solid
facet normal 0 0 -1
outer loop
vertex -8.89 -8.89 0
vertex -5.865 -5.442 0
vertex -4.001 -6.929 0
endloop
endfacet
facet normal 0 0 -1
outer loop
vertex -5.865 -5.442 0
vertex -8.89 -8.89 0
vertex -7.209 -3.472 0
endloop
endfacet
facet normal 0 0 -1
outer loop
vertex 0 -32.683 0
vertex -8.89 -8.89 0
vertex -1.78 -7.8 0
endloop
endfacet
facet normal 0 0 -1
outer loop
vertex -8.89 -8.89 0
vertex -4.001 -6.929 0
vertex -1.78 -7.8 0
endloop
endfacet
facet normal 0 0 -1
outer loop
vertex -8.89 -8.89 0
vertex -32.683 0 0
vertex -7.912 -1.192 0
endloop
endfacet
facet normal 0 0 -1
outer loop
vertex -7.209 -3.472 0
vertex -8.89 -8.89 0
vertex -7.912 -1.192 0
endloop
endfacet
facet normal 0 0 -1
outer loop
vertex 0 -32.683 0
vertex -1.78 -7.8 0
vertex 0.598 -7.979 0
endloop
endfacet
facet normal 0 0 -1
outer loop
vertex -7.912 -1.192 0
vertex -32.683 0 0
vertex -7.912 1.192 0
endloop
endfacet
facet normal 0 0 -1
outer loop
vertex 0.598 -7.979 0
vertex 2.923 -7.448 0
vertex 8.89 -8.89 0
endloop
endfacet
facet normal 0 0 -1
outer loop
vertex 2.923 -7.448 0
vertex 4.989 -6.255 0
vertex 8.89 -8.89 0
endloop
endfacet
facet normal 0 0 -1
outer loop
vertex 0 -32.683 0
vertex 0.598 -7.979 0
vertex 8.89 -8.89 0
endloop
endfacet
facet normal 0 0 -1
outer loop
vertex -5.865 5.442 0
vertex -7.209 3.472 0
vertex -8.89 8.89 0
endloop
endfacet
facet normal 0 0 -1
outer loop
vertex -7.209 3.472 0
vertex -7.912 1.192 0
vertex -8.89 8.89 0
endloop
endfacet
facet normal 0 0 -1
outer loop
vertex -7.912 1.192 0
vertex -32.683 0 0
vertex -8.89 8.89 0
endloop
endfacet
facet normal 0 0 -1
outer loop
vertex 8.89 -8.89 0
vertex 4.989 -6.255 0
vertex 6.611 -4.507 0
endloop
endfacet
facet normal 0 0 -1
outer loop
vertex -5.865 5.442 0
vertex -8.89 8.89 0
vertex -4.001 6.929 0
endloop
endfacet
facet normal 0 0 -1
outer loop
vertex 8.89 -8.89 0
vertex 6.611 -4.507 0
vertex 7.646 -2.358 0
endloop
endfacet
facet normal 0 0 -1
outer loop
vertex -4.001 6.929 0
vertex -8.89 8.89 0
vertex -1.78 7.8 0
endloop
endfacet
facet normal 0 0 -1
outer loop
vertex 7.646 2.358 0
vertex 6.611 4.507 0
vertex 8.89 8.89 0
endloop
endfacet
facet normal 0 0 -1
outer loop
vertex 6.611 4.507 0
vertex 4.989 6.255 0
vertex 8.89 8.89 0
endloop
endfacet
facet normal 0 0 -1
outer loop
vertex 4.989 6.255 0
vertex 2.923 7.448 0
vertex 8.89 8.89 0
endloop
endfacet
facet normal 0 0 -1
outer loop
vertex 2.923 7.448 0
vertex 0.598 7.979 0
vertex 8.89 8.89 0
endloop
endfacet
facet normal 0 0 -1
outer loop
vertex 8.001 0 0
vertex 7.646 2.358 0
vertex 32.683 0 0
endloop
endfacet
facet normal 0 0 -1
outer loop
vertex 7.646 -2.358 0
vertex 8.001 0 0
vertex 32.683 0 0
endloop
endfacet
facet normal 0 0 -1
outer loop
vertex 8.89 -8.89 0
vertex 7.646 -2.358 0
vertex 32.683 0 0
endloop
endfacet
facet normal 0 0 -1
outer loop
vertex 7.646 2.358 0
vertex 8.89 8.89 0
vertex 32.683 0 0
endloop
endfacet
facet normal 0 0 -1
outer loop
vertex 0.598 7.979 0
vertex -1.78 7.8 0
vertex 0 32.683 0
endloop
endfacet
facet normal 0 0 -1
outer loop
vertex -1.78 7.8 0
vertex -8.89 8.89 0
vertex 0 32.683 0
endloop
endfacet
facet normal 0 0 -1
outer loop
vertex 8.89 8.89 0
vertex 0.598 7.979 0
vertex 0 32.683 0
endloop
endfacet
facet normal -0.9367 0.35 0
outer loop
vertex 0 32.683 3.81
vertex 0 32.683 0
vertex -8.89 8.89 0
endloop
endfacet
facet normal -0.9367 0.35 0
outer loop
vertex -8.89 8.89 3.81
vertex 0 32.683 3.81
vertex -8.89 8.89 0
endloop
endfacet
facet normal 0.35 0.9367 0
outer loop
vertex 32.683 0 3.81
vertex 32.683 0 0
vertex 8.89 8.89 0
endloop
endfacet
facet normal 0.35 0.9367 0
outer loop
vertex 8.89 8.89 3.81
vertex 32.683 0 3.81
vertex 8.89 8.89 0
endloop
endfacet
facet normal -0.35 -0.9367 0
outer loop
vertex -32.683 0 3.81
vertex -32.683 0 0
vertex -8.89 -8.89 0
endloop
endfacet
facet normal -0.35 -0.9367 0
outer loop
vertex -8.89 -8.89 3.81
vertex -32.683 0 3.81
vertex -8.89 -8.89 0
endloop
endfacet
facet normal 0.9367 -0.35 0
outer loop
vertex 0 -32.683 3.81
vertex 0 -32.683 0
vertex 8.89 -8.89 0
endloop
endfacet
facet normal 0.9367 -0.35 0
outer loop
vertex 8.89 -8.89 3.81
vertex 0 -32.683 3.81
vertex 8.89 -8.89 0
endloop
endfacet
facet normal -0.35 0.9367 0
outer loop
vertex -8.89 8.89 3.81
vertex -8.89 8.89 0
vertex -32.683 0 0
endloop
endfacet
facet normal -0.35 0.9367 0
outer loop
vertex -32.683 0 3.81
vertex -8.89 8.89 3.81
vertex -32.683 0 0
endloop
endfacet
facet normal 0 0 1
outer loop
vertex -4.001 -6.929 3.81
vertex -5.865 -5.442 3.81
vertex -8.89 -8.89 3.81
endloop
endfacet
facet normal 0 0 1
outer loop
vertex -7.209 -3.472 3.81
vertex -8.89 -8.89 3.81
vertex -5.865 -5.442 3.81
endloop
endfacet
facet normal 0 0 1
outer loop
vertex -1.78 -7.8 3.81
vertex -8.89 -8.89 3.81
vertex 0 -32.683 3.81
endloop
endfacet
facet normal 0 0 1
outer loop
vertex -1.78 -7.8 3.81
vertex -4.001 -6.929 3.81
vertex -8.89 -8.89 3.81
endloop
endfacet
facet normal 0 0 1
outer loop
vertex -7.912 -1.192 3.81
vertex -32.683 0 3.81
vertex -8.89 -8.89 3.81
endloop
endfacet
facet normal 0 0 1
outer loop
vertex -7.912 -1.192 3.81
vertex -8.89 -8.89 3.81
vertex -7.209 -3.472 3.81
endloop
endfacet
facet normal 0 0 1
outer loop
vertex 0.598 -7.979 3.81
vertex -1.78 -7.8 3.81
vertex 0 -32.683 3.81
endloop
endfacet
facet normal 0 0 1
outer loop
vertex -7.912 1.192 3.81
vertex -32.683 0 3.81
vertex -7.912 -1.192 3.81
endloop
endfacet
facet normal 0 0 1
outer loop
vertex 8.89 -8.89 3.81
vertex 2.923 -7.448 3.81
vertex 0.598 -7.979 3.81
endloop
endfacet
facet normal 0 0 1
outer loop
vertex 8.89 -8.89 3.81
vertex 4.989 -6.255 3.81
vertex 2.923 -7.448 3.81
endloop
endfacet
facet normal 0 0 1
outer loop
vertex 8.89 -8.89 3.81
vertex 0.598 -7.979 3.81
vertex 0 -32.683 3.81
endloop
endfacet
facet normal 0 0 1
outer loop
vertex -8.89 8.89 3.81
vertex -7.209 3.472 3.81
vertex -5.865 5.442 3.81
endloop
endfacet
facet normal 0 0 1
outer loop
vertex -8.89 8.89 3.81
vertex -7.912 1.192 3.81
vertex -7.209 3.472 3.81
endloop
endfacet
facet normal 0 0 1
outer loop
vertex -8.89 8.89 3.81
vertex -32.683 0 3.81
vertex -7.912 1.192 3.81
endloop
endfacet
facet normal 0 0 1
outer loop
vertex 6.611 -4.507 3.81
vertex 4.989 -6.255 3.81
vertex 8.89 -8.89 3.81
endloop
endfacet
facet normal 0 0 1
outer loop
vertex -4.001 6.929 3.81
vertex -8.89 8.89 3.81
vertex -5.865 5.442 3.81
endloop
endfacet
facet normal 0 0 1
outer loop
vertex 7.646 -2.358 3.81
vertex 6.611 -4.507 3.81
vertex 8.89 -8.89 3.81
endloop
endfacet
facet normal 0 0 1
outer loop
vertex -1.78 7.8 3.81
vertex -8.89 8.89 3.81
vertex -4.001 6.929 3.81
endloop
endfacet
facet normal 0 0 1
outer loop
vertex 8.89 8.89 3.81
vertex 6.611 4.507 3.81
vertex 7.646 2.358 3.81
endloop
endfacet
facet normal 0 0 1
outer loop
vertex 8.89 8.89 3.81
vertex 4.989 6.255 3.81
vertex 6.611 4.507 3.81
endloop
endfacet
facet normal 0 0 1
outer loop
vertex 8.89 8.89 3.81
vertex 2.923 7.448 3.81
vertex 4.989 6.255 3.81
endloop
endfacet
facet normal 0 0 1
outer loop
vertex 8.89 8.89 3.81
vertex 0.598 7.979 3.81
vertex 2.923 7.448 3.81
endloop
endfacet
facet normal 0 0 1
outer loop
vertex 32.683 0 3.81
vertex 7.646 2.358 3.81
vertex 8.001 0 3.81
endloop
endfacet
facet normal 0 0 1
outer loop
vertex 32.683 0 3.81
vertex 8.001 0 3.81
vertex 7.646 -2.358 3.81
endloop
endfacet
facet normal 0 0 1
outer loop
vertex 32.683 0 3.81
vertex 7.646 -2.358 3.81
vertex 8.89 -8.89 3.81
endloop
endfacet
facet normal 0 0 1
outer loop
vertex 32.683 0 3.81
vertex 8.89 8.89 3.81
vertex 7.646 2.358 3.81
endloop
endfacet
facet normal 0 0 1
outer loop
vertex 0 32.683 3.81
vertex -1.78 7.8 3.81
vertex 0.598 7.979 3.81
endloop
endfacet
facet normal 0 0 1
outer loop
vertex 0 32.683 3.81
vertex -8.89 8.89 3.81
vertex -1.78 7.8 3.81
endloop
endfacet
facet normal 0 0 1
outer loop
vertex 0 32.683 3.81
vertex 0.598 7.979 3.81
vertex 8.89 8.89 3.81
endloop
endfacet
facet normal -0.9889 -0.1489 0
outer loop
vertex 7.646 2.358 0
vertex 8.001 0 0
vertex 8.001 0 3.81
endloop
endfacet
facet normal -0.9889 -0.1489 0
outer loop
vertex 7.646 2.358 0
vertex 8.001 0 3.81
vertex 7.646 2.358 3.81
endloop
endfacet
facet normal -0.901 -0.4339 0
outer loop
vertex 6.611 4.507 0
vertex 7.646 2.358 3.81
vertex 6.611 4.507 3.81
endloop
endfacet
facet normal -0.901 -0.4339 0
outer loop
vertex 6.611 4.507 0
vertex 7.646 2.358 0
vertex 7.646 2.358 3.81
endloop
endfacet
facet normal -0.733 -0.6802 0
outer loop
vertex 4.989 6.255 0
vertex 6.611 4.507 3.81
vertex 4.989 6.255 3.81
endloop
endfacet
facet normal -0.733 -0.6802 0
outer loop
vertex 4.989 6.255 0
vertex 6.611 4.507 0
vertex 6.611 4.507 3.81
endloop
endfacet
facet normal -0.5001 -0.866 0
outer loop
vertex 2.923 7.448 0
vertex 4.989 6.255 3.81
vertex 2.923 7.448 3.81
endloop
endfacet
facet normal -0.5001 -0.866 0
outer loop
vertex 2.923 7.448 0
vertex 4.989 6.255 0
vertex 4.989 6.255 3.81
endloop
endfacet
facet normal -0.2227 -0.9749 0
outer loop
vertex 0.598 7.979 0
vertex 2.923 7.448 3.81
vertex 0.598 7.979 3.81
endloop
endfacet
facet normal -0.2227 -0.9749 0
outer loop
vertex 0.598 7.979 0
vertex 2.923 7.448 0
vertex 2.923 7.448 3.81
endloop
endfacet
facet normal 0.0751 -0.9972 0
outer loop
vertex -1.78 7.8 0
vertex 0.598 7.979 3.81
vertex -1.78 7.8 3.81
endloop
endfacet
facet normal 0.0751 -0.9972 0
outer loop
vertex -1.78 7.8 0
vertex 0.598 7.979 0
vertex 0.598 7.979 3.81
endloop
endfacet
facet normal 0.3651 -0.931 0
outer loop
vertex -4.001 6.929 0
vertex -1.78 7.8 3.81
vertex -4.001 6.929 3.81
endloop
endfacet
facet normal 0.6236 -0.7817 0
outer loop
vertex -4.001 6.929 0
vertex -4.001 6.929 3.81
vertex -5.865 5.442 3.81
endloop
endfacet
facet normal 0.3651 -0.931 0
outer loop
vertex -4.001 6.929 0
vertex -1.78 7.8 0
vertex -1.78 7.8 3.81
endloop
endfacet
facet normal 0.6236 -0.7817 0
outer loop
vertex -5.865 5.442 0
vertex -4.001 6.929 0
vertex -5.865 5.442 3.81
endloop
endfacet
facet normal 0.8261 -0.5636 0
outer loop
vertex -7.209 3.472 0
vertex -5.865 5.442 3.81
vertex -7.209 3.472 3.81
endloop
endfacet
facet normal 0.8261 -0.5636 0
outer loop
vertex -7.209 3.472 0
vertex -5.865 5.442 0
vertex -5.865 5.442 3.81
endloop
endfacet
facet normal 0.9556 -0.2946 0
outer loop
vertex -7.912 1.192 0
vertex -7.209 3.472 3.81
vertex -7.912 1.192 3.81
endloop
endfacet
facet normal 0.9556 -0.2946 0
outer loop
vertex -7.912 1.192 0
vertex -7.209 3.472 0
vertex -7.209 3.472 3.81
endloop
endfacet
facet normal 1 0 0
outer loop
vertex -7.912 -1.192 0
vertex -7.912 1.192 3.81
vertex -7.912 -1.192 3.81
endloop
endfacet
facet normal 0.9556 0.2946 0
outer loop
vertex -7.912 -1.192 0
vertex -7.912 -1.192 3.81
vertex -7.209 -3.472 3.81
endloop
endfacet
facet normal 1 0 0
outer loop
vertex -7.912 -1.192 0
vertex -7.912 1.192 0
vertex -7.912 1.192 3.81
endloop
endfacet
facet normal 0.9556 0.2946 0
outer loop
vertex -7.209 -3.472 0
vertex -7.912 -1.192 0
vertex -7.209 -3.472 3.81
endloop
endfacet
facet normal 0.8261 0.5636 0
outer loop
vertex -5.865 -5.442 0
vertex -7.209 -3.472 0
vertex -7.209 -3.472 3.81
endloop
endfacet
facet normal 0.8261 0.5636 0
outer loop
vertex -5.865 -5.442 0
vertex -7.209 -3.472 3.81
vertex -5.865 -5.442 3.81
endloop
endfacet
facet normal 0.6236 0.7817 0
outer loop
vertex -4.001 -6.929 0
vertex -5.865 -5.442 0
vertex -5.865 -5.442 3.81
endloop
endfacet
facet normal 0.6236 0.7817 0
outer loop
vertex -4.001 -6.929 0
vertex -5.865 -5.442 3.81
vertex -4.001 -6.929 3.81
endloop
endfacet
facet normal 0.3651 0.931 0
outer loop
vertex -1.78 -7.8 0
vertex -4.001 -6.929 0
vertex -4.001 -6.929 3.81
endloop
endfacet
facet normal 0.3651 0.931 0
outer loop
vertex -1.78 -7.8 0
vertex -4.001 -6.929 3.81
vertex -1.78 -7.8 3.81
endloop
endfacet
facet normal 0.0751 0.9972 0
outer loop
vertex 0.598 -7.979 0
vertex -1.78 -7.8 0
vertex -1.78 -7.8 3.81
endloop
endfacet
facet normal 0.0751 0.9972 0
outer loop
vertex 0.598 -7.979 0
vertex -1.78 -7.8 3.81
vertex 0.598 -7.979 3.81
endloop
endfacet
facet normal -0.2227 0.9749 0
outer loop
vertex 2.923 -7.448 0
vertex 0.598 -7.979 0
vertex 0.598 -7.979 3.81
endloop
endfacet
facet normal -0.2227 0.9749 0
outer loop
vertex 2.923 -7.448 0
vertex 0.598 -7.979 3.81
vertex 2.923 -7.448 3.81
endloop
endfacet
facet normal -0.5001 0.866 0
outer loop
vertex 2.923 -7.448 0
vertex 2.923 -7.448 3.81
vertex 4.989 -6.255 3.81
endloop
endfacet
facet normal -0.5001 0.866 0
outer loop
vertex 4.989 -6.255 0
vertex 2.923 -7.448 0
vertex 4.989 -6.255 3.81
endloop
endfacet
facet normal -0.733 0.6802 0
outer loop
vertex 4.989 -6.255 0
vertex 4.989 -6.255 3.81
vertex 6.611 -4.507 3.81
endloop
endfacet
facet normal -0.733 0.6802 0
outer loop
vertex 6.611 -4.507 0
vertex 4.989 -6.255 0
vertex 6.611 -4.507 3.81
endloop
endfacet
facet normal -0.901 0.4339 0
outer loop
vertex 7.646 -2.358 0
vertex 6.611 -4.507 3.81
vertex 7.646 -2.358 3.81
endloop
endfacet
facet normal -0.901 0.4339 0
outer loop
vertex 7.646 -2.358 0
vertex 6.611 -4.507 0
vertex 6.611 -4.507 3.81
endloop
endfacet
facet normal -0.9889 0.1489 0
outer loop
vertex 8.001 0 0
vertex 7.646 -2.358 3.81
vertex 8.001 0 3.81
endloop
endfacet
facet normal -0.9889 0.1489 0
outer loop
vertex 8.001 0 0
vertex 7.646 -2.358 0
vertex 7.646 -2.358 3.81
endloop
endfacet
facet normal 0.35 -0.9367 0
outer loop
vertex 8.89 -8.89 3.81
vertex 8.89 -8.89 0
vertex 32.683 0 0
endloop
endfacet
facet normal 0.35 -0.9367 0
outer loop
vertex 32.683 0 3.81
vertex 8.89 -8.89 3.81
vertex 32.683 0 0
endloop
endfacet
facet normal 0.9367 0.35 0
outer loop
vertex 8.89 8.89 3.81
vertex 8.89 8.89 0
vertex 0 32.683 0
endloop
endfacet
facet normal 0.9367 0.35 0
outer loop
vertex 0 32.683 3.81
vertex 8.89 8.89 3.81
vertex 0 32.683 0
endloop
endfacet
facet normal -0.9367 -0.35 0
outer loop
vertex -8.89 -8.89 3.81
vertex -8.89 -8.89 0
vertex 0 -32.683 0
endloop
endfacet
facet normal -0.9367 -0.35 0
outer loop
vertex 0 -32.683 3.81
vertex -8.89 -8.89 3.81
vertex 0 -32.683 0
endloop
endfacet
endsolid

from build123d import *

# Parameters (mm, degrees)
F0_W     = 17.78
F0_H     = 17.78
F0_R     = 8.001
F1_DEPTH = 3.81


with BuildPart() as f1:
    # F0 (on Top) → F1 (new body)
    with BuildSketch(Plane.XY):
        Polygon((-8.89, 8.89), (8.89, 8.89), (0, 32.683442), align=None)
        Polygon((-8.89, -8.89), (-8.89, 8.89), (-32.683442, 0), align=None)
        Polygon((0, -32.683442), (8.89, -8.89), (-8.89, -8.89), align=None)
        Polygon((32.683442, 0), (8.89, 8.89), (8.89, -8.89), align=None)
        Rectangle(F0_W, F0_H)
        Circle(F0_R, mode=Mode.SUBTRACT)
    extrude(amount=F1_DEPTH)


solid = f1.part
